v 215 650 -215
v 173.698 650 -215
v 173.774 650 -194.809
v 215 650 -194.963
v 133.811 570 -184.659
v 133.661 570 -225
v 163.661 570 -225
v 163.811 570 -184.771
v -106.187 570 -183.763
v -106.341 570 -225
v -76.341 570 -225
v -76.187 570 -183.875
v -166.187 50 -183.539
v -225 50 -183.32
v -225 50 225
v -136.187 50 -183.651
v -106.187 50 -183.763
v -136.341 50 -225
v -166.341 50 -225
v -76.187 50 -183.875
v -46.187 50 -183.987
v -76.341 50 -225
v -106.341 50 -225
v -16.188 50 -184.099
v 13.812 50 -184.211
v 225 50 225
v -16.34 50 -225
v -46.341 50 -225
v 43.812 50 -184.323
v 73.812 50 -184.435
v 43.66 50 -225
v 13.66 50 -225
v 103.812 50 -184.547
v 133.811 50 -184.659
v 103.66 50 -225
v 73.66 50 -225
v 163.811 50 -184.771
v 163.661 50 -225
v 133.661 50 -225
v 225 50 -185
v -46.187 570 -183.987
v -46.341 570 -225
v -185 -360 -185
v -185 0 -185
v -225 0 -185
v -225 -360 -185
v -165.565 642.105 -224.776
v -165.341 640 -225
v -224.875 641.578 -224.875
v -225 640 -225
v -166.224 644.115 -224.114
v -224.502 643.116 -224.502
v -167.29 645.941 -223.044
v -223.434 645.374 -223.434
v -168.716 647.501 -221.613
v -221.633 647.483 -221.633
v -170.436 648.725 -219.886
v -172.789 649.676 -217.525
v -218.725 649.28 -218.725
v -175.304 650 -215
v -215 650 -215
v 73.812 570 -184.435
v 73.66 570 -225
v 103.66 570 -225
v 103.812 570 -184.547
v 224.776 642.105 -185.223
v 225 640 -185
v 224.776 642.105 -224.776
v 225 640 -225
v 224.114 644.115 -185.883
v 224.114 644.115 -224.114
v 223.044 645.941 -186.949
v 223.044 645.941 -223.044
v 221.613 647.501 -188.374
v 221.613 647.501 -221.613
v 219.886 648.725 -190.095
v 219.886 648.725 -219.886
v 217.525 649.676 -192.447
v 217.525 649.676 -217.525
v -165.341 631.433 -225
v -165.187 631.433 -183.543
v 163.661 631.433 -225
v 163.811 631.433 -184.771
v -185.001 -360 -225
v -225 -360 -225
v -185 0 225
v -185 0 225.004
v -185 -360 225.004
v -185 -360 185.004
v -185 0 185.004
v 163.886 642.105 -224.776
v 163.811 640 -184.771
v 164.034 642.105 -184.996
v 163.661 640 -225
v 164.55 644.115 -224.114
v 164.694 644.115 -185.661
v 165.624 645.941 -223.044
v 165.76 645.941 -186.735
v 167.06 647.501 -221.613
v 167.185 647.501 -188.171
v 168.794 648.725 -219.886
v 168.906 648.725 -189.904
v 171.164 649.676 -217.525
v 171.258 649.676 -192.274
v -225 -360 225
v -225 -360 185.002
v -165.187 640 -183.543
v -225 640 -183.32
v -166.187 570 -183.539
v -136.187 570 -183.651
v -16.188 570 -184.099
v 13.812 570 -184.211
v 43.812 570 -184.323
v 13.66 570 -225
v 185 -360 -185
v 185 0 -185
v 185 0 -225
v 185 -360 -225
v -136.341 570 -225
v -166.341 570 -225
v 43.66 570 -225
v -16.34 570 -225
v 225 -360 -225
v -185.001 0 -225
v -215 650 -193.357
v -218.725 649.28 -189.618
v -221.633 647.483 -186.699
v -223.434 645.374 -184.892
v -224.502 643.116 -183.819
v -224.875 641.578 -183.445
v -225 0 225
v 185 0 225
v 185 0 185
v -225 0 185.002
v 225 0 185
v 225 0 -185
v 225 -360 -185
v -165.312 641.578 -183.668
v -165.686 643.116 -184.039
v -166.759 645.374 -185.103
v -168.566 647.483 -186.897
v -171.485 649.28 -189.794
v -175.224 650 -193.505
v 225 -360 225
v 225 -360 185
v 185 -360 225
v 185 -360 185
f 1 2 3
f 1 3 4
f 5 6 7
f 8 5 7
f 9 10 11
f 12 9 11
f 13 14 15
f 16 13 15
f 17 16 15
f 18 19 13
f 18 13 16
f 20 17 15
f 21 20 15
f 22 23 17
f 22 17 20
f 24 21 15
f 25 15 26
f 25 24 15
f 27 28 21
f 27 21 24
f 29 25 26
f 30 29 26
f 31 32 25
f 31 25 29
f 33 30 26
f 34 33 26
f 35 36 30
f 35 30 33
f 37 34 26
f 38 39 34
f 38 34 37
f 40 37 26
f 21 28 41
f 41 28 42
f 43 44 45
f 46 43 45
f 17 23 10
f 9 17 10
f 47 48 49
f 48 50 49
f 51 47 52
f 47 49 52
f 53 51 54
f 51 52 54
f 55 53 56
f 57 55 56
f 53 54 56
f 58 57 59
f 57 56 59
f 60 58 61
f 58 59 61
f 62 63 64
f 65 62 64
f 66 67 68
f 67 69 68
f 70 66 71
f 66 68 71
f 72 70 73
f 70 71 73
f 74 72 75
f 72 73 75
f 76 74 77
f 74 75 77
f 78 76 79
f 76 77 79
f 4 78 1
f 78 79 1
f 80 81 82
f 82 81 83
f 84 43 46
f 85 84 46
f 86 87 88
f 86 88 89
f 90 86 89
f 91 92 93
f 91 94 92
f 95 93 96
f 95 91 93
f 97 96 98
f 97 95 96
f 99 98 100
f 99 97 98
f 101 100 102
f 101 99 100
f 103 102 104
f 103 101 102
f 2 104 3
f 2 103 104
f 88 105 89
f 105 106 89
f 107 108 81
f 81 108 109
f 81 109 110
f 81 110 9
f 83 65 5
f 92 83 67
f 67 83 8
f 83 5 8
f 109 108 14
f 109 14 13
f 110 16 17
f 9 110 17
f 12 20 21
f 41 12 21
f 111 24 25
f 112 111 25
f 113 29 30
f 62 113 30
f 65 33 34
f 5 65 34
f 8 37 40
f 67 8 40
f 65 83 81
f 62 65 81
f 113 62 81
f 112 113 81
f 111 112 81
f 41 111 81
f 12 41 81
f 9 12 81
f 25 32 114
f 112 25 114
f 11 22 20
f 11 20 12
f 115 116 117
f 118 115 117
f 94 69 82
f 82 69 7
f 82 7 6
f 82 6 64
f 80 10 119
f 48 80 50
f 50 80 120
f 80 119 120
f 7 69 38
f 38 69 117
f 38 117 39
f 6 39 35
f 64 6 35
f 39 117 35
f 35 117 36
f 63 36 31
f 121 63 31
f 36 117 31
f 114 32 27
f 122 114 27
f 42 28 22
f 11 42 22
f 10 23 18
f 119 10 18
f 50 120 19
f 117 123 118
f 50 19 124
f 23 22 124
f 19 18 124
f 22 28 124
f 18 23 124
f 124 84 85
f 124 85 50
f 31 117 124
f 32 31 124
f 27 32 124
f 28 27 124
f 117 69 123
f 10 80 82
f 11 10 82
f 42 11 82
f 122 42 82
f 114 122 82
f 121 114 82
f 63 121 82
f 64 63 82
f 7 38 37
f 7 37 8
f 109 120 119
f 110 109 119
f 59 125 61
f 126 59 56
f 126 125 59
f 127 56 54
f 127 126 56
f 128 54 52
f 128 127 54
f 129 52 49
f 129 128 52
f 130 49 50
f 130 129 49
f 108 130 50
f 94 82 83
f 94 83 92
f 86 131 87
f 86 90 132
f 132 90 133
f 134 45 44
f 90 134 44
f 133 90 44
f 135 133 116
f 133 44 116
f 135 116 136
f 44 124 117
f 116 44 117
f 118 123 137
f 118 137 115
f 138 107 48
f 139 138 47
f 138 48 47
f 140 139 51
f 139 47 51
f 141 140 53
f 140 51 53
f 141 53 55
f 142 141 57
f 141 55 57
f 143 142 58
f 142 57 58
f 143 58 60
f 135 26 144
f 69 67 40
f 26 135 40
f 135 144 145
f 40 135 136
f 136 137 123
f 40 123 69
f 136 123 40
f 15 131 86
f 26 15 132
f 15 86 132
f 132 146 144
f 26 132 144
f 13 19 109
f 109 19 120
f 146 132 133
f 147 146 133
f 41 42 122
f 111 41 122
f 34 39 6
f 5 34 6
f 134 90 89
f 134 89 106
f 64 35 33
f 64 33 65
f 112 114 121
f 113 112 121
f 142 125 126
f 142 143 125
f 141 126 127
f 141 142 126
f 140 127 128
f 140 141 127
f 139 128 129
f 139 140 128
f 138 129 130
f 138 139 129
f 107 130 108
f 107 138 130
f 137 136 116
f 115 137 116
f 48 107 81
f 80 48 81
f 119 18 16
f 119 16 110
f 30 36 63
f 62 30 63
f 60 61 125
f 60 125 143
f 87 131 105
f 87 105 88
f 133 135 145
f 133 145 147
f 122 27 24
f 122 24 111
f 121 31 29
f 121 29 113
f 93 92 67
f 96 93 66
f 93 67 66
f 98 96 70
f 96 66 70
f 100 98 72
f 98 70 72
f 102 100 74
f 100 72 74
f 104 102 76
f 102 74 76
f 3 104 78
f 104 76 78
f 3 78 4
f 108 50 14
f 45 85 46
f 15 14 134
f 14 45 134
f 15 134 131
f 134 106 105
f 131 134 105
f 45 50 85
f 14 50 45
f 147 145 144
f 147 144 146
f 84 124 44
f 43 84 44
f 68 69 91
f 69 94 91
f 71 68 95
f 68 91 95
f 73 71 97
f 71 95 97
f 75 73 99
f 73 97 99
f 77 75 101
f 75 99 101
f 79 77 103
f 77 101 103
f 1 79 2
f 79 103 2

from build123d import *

# Parameters (mm, degrees)
SKETCH1_W           = 450
SKETCH1_H           = 450
BOSS_EXTRUDE1_DEPTH = 50
SKETCH2_W           = 40
SKETCH2_H           = 40
BOSS_EXTRUDE2_DEPTH = 360
BOSS_EXTRUDE3_DEPTH = 600
SKETCH4_W           = 30
SKETCH4_H           = 520
CUT_EXTRUDE2_DEPTH  = 300
FILLET2_R           = 10
FILLET4_R           = 10


with BuildPart() as part:
    # Sketch1 → Boss-Extrude1 (new body)
    with BuildSketch(Plane(origin=(0, 0, 0), x_dir=(1, 0, 0), z_dir=(0, 1, 0))):
        Rectangle(SKETCH1_W, SKETCH1_H)
    extrude(amount=BOSS_EXTRUDE1_DEPTH)

    # Sketch2 → Boss-Extrude2 (add)
    with BuildSketch(Plane(origin=(0, 0, 0), x_dir=(-1, 0, 0), z_dir=(0, -1, 0))):
        Polygon((225, -225), (185.000000233, -225.004313347), (185.000000057, -185.004313347), (225, -185.002182787), align=None)
        Polygon((185.000923636, 225), (185, 185.000000011), (225, 185.000000011), (225, 225), align=None)
        with Locations((-205, 205)):
            Rectangle(SKETCH2_W, SKETCH2_H)
        with Locations((-205, -205)):
            Rectangle(SKETCH2_W, SKETCH2_H)
    extrude(amount=BOSS_EXTRUDE2_DEPTH)

    # Sketch3 → Boss-Extrude3 (add)
    with BuildSketch(Plane(origin=(0, 50, 0), x_dir=(1, 0, 0), z_dir=(0, 1, 0))):
        Polygon((-225, 225), (-225, 183.319526978), (225, 185.000000043), (225, 225), align=None)
    extrude(amount=BOSS_EXTRUDE3_DEPTH)

    # Sketch4 → Cut-Extrude2 (cut, symmetric)
    with BuildSketch(Plane(origin=(-0.687713792, 0, -184.157195323), x_dir=(0.999993027, 0, -0.003734359), z_dir=(0.003734359, 0, 0.999993027))):
        with Locations((-150.5, 310)):
            Rectangle(SKETCH4_W, SKETCH4_H)
        with Locations((89.5, 310)):
            Rectangle(SKETCH4_W, SKETCH4_H)
        with Locations((-90.5, 310)):
            Rectangle(SKETCH4_W, SKETCH4_H)
        with Locations((-30.5, 310)):
            Rectangle(SKETCH4_W, SKETCH4_H)
        with Locations((149.5, 310)):
            Rectangle(SKETCH4_W, SKETCH4_H)
        with Locations((29.5, 310)):
            Rectangle(SKETCH4_W, SKETCH4_H)
        Polygon((-164.5, 631.432523358), (164.5, 631.432523358), (164.5, 652.515401433), (-164.5, 650), align=None)
    extrude(amount=CUT_EXTRUDE2_DEPTH, both=True, mode=Mode.SUBTRACT)

    # Fillet2
    fillet2_edges = [part.edges().sort_by_distance(p)[0] for p in [
        (194.330455246, 650, -225),
        (225, 650, -205.000000022),
        (194.405569596, 650, -184.885748674),
        (163.736024842, 650, -204.885748652),
    ]]
    fillet(fillet2_edges, radius=FILLET2_R)

    # Fillet4
    fillet4_edges = [part.edges().sort_by_distance(p)[0] for p in [
        (-225, 650, -204.159763489),
        (-195.093283388, 650, -183.43121016),
        (-195.170691778, 650, -225),
        (-165.263975166, 650, -204.271446671),
    ]]
    fillet(fillet4_edges, radius=FILLET4_R)


solid = part.part
